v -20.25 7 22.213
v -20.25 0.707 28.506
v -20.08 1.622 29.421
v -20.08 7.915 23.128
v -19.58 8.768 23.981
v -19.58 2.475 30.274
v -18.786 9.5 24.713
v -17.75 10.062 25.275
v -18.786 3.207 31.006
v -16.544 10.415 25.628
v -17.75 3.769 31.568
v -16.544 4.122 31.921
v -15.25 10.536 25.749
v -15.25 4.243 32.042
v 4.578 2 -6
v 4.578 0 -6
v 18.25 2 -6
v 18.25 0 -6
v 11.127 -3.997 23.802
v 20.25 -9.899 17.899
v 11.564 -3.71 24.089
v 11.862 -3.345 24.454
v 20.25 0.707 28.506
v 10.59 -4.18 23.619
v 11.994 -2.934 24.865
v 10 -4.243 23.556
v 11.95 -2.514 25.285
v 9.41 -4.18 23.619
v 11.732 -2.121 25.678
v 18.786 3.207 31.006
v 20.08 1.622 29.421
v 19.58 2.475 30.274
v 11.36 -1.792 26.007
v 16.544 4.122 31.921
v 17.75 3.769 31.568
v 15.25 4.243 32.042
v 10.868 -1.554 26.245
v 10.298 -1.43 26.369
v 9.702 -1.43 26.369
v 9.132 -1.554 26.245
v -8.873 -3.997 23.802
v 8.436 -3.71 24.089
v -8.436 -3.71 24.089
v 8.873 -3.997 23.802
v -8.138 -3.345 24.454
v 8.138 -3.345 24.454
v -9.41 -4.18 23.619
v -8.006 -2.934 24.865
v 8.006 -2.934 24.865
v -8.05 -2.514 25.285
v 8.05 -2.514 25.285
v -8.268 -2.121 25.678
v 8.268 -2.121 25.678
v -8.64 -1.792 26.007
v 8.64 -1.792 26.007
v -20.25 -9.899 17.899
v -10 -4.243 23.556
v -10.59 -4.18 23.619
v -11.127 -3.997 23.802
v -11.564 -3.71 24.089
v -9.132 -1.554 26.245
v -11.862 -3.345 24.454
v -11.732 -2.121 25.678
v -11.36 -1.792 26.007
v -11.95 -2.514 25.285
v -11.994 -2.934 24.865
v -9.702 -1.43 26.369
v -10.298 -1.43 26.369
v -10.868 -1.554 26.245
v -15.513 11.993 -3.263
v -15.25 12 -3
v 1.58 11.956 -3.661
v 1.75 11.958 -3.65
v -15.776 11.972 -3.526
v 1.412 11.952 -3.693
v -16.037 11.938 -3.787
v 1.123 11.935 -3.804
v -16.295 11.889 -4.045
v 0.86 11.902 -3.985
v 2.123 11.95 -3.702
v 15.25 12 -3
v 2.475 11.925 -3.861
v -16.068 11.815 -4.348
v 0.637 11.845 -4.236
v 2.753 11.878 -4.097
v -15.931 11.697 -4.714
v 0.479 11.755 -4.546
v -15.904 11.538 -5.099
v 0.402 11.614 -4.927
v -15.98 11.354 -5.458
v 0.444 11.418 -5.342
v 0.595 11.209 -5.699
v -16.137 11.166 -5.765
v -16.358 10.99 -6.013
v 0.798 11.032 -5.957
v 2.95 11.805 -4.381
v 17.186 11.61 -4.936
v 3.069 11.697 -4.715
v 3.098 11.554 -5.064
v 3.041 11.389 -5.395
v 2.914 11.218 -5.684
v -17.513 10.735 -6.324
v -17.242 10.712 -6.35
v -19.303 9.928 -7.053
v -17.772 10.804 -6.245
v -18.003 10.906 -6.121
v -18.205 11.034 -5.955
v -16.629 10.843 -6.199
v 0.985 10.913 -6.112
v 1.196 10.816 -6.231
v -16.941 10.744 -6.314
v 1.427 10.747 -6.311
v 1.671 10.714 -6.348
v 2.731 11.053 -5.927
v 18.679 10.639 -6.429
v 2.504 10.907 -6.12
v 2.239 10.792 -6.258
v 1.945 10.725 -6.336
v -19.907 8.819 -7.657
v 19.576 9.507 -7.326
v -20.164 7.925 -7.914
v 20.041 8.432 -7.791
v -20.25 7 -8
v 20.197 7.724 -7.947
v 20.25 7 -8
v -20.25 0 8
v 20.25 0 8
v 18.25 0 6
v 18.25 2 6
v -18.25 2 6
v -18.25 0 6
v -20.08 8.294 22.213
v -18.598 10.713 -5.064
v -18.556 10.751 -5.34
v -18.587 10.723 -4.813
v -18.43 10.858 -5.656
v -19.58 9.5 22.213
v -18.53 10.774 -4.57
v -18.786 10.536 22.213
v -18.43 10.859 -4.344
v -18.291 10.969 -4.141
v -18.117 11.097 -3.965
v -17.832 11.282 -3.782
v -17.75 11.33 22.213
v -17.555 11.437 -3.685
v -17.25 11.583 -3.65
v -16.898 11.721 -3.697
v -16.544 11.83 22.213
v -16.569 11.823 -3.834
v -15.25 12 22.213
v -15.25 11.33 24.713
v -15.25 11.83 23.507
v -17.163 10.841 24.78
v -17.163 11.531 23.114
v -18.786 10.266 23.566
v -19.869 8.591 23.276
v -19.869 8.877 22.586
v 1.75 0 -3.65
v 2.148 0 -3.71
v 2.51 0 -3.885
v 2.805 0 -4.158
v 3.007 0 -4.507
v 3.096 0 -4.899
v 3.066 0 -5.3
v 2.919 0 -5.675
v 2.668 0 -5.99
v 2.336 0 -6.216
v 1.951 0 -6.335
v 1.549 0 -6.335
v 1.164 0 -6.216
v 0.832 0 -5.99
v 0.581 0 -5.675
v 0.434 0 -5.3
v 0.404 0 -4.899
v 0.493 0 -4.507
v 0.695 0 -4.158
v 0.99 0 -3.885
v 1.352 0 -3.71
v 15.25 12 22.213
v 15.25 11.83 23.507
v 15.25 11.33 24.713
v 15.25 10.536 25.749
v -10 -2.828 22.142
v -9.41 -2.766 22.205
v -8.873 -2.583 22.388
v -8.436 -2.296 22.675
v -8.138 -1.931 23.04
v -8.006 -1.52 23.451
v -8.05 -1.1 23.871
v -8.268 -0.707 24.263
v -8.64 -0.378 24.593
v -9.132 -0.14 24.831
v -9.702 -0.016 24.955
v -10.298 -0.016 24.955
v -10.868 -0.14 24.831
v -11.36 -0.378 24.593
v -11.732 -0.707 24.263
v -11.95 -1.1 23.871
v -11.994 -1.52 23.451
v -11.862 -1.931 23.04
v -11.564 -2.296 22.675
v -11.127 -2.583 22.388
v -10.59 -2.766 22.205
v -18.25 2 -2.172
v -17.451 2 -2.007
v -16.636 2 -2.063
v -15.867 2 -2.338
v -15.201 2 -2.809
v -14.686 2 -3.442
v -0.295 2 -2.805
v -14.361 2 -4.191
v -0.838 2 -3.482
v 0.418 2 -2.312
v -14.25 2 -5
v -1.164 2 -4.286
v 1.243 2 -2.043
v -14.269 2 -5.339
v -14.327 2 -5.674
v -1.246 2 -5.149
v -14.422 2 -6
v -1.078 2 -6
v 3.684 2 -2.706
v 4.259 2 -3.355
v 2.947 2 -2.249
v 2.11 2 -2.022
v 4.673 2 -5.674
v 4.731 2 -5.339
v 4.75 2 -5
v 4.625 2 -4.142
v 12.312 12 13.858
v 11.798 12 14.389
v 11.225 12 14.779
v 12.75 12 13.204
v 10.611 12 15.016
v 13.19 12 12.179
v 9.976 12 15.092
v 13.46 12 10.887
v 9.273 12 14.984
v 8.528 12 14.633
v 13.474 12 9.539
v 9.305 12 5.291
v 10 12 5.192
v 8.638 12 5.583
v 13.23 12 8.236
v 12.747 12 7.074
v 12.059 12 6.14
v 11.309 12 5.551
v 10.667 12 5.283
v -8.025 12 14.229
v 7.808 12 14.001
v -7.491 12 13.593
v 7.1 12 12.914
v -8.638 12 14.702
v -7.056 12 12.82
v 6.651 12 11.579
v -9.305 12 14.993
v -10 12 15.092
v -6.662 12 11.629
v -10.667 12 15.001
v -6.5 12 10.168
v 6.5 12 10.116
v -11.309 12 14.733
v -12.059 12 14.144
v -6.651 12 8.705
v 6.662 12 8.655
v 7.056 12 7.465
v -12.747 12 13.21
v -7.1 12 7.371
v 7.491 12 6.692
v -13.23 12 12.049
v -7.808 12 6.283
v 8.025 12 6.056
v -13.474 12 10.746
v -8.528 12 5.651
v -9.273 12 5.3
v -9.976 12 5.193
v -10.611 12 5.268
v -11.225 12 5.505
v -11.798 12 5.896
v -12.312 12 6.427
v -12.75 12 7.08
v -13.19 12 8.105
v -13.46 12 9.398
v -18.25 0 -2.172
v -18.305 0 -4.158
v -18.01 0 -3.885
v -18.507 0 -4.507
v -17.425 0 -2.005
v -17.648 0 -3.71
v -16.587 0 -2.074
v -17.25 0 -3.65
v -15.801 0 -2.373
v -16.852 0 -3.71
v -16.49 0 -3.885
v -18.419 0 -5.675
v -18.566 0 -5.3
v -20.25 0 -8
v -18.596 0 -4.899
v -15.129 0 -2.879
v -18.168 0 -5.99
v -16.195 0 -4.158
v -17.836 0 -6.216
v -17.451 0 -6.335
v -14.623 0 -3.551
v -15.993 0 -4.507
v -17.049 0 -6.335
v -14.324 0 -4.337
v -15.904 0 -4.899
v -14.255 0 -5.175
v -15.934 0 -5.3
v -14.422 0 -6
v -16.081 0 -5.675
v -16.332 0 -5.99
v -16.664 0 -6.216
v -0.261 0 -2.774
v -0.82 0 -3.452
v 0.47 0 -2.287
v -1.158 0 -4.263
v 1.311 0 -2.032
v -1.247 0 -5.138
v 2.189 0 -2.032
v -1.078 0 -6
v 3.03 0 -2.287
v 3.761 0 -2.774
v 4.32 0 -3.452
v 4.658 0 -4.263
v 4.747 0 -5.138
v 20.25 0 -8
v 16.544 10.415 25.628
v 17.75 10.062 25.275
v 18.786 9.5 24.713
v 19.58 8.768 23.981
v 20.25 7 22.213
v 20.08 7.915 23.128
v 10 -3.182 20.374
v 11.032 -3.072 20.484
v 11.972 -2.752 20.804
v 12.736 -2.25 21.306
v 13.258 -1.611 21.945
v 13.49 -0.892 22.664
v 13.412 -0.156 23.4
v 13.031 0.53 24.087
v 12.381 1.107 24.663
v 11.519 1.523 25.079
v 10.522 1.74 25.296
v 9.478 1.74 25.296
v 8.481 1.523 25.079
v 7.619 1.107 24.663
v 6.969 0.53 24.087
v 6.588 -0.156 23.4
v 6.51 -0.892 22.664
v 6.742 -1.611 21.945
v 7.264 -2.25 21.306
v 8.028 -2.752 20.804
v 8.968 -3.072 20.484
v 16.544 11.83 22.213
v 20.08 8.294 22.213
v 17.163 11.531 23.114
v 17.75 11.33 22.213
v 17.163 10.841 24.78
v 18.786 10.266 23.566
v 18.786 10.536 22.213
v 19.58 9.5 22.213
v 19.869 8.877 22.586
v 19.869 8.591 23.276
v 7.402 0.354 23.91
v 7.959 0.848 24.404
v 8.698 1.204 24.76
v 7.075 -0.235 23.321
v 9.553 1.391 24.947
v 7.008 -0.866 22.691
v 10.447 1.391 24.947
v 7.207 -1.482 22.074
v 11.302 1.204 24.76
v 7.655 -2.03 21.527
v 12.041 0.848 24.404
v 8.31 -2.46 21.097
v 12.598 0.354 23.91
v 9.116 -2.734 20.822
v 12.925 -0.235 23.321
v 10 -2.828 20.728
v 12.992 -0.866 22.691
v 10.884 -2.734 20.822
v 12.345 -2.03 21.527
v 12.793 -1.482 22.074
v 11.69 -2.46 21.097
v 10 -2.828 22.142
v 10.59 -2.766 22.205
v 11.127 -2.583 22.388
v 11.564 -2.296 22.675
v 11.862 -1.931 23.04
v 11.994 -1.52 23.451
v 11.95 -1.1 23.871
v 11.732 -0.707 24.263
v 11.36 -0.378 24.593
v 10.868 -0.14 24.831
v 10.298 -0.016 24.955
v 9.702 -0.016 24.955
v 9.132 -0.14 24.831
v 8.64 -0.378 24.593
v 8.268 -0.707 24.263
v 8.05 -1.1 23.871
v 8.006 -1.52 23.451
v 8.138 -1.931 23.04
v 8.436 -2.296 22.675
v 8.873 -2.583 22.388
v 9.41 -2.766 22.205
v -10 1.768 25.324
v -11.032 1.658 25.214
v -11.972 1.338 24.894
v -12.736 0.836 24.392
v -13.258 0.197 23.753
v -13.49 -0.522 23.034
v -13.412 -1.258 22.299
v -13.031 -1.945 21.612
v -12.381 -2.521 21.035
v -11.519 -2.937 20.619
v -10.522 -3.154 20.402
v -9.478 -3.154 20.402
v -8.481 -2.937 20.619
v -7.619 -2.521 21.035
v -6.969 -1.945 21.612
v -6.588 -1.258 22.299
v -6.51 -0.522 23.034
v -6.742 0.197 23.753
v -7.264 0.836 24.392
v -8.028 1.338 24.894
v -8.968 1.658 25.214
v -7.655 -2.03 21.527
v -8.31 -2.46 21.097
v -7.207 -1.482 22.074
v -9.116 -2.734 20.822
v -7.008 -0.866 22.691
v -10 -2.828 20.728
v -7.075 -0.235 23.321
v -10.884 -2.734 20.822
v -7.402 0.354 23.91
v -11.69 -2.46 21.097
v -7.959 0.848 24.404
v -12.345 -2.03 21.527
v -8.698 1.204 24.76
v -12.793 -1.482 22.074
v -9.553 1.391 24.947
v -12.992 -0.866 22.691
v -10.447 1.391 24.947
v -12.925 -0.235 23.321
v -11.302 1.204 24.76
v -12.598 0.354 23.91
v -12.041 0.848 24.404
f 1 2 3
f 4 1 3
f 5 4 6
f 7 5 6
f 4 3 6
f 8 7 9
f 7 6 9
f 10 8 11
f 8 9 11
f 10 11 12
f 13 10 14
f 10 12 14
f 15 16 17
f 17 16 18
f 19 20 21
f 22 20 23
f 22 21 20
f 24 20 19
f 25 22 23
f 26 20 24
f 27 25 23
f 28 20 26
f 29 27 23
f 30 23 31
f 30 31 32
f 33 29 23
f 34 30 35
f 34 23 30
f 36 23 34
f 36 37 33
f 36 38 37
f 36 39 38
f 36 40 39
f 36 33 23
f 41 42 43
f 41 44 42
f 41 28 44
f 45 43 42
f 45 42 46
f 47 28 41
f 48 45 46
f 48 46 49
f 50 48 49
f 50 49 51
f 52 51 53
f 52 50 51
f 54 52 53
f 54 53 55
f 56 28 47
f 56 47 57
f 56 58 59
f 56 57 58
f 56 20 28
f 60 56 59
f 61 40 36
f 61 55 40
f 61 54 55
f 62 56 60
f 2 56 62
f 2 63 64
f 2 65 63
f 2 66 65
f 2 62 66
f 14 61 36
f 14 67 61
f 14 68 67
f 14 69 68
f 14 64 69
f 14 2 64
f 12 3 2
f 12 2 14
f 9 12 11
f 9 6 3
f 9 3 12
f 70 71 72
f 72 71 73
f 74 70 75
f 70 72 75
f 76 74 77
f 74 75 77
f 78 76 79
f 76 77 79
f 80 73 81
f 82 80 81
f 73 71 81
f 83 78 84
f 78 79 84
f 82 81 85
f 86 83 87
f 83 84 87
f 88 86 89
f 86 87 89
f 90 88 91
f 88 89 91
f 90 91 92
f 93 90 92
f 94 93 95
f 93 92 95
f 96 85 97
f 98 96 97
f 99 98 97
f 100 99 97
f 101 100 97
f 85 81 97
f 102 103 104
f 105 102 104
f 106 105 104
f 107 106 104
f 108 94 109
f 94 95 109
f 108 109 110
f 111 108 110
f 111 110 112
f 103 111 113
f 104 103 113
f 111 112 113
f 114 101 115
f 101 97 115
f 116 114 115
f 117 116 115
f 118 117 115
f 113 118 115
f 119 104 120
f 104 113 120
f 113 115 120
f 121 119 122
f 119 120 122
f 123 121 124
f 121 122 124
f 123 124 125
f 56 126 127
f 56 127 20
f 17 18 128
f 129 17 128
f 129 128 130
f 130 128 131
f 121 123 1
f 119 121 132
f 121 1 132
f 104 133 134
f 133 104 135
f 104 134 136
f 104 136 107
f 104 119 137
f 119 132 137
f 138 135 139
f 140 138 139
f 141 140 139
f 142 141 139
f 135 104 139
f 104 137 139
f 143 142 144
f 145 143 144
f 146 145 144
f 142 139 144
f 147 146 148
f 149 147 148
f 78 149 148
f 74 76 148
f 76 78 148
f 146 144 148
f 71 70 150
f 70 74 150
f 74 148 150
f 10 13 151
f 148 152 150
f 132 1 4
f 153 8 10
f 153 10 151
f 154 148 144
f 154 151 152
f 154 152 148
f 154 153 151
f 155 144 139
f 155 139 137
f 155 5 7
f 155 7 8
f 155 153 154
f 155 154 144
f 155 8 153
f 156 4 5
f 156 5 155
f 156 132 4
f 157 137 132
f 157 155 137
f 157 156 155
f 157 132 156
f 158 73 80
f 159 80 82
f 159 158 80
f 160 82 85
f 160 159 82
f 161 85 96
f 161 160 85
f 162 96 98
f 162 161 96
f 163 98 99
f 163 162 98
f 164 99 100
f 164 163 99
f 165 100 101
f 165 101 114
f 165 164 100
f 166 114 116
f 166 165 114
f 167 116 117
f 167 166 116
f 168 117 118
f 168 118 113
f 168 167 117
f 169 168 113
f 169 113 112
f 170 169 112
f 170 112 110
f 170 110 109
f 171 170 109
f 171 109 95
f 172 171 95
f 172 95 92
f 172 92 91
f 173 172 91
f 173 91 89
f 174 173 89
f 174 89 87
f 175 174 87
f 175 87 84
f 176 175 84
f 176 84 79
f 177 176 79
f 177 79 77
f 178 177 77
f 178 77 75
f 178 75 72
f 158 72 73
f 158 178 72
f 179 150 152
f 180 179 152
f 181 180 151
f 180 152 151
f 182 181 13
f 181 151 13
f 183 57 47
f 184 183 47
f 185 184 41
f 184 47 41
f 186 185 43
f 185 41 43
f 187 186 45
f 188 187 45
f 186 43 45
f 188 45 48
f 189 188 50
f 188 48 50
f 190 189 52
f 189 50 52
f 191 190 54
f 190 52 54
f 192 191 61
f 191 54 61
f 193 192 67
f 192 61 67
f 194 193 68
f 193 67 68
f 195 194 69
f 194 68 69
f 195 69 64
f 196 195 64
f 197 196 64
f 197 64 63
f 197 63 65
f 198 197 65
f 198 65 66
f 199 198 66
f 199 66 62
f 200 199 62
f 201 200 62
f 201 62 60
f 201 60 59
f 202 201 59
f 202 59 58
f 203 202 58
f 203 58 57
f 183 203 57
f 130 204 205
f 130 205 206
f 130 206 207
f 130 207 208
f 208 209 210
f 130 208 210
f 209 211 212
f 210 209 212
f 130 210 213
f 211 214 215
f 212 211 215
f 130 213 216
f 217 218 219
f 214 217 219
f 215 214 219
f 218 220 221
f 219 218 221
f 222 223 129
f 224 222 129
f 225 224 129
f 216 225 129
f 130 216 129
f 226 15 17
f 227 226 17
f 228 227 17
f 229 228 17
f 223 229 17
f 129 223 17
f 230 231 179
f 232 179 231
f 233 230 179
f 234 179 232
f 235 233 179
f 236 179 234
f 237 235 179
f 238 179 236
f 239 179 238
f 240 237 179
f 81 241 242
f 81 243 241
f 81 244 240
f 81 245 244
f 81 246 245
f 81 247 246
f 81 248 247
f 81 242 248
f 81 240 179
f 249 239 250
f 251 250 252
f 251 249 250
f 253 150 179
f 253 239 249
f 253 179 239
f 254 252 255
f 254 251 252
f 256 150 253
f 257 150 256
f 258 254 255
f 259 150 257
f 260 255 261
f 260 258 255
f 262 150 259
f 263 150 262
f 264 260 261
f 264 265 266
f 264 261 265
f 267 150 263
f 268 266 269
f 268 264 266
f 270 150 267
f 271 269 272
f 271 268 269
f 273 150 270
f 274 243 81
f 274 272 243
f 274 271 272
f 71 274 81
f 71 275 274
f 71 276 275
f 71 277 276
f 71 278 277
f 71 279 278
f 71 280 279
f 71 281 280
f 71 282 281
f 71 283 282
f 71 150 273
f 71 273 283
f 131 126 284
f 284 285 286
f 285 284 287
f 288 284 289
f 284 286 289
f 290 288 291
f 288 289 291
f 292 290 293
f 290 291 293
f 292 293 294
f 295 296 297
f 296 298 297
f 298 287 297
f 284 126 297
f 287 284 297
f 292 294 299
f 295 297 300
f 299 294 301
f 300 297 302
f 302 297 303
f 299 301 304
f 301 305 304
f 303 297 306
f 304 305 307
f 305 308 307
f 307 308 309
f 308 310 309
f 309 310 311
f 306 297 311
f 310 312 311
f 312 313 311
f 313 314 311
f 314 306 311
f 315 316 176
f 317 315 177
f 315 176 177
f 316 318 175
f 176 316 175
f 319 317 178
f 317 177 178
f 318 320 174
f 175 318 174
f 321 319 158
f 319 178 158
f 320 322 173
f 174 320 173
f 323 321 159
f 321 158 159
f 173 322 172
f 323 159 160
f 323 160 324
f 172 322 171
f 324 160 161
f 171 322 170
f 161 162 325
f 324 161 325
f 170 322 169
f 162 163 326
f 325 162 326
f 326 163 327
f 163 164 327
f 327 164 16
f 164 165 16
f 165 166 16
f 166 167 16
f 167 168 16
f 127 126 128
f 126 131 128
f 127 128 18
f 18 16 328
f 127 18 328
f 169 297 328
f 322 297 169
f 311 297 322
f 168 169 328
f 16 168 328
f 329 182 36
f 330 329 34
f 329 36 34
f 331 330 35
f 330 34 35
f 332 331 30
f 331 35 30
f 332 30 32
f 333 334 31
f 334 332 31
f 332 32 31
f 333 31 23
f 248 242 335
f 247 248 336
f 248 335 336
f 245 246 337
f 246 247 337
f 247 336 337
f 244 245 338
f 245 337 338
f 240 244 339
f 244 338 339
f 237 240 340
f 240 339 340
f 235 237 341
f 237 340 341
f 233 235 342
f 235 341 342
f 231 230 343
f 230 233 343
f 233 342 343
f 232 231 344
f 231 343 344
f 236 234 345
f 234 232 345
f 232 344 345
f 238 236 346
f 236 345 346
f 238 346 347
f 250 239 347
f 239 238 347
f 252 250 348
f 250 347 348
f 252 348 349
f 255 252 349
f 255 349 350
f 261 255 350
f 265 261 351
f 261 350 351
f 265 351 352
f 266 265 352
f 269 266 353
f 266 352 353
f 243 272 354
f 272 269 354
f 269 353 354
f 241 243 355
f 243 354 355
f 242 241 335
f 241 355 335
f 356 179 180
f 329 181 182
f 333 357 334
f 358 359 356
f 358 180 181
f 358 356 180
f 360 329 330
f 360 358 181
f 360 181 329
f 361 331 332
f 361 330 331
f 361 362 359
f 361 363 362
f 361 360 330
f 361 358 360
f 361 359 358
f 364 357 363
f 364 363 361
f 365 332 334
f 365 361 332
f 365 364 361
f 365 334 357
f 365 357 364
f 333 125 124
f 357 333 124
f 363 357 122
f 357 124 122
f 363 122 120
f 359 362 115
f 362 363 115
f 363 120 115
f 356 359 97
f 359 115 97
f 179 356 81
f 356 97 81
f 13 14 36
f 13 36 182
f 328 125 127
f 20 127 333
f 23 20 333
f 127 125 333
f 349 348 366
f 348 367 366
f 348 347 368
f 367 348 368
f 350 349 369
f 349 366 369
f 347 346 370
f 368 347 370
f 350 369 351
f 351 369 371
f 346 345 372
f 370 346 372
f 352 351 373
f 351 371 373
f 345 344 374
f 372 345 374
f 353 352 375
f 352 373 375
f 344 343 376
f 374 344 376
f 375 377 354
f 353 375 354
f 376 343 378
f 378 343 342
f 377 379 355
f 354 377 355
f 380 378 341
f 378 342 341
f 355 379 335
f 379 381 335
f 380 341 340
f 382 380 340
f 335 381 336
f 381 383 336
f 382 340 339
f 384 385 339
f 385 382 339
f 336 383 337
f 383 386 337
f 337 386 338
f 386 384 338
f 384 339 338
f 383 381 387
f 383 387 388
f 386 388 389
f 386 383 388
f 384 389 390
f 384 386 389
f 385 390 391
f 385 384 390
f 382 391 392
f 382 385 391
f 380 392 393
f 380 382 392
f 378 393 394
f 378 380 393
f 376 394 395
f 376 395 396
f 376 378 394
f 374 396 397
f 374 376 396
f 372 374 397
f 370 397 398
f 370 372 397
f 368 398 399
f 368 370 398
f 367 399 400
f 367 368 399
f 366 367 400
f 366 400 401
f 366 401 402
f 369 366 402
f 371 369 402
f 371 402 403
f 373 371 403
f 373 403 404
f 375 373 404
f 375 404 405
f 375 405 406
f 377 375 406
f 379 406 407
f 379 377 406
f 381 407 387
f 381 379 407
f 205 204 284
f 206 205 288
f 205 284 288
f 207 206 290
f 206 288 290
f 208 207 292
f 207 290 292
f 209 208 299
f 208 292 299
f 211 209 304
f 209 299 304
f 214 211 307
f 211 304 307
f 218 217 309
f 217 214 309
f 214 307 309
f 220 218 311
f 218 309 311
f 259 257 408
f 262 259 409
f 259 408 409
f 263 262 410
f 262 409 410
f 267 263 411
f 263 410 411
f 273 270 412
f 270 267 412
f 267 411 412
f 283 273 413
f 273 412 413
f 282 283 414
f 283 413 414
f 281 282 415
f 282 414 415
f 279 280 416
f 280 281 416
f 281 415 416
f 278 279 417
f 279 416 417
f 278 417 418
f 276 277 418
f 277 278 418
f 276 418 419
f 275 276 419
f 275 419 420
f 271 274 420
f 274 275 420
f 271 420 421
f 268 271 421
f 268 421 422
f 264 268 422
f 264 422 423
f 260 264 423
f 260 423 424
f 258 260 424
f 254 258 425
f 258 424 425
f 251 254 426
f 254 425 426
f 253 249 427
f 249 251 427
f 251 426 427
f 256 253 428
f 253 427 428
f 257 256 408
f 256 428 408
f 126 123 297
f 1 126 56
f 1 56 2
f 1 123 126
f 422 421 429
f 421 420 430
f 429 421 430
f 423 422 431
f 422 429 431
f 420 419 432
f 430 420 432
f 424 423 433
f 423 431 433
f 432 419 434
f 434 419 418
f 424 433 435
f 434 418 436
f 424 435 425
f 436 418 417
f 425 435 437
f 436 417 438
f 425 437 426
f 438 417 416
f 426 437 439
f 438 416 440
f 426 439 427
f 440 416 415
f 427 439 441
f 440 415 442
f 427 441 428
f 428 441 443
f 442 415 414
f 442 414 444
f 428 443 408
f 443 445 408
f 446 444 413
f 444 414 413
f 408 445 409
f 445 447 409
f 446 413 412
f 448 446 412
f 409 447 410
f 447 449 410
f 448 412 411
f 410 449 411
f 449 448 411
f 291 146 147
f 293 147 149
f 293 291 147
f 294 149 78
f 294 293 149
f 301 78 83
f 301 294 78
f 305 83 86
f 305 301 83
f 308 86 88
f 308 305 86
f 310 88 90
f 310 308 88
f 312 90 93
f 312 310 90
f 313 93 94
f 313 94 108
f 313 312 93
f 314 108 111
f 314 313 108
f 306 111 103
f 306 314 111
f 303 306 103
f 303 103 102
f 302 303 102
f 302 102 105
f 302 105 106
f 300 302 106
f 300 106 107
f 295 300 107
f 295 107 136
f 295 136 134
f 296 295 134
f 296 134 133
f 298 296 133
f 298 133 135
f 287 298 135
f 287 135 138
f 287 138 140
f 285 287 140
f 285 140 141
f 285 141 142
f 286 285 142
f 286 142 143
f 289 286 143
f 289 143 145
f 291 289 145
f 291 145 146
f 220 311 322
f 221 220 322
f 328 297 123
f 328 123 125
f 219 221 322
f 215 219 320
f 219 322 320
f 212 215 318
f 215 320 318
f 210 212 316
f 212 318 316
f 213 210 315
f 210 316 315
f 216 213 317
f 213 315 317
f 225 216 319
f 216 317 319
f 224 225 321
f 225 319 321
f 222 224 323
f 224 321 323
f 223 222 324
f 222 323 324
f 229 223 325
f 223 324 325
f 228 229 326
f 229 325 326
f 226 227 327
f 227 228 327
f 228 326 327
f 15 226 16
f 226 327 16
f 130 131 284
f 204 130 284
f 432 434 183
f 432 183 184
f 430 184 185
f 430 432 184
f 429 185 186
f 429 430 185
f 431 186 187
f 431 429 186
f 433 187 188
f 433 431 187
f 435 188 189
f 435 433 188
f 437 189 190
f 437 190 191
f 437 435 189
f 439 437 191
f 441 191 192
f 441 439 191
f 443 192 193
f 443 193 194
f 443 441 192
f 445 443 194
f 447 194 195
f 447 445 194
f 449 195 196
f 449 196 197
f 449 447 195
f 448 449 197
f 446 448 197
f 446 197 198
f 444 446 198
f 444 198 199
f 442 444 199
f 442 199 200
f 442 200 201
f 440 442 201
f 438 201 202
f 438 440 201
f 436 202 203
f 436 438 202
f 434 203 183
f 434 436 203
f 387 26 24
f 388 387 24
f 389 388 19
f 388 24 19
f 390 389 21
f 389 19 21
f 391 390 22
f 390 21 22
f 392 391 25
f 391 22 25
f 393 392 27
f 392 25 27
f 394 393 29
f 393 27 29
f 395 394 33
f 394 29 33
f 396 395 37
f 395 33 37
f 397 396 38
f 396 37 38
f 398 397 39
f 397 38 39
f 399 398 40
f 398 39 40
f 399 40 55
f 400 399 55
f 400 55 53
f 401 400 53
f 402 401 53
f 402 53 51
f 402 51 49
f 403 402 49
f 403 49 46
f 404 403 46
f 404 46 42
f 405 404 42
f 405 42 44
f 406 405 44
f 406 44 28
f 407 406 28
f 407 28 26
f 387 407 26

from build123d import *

# Parameters (mm, degrees)
SKETCH1_W           = 40.5
SKETCH1_H           = 16
SKETCH1_R           = 1.35
BOSS_EXTRUDE1_DEPTH = 12
BOSS_EXTRUDE2_START = 2
BOSS_EXTRUDE2_DEPTH = 10
BOSS_EXTRUDE3_DEPTH = 40.5
SKETCH4_R           = 2
CUT_EXTRUDE3_DEPTH  = 40.502331785
CUT_EXTRUDE4_START  = -3
SKETCH4_5_R         = 3.5
SKETCH4_5_R_2       = 2
CUT_EXTRUDE4_DEPTH  = 37.502331785
CHAMFER2_SIZE       = 1
FILLET2_R           = 5


with BuildPart() as part:
    # Sketch1 → Boss-Extrude1 (new body)
    with BuildSketch(Plane(origin=(0, 0, 0), x_dir=(1, 0, 0), z_dir=(0, 1, 0))):
        Rectangle(SKETCH1_W, SKETCH1_H)
        with Locations(Location((-17.25, 5, 0), (0, 0, 270))):
            Circle(SKETCH1_R, mode=Mode.SUBTRACT)
        with BuildLine():
            Line((-14.421572875, 6), (-1.078427125, 6))
            ThreePointArc((-1.078427125, 6), (1.75, 2), (4.578427125, 6))
            Line((4.578427125, 6), (18.25, 6))
            Line((18.25, 6), (18.25, -6))
            Line((18.25, -6), (-18.25, -6))
            Line((-18.25, -6), (-18.25, 2.171572875))
            ThreePointArc((-18.25, 2.171572875), (-15.128679656, 2.878679656), (-14.421572875, 6))
        make_face(mode=Mode.SUBTRACT)
        with Locations(Location((1.75, 5, 0), (0, 0, 270))):
            Circle(SKETCH1_R, mode=Mode.SUBTRACT)
    extrude(amount=BOSS_EXTRUDE1_DEPTH)

    # Sketch1<3> → Boss-Extrude2 (add)
    with BuildSketch(Plane(origin=(0, 0, 0), x_dir=(1, 0, 0), z_dir=(0, 1, 0)).offset(BOSS_EXTRUDE2_START)):
        with BuildLine():
            ThreePointArc((-14.25, 5), (-15.517949192, 2.550510257), (-18.25, 2.171572875))
            Line((-18.25, 2.171572875), (-18.25, -6))
            Line((-18.25, -6), (18.25, -6))
            Line((18.25, -6), (18.25, 6))
            Line((18.25, 6), (4.578427125, 6))
            ThreePointArc((4.578427125, 6), (4.706795679, 5.507305936), (4.75, 5))
            ThreePointArc((4.75, 5), (1.242694064, 2.043204321), (-1.078427125, 6))
            Line((-1.078427125, 6), (-14.421572875, 6))
            ThreePointArc((-14.421572875, 6), (-14.293204321, 5.507305936), (-14.25, 5))
        make_face()
    extrude(amount=BOSS_EXTRUDE2_DEPTH)

    # Sketch3 → Boss-Extrude3 (add)
    with BuildSketch(Plane.ZY.offset(20.25)):
        Polygon((8, 0), (17.899494937, -9.899494937), (32.04163056, 4.242640687), (24.284271247, 12), (8, 12), align=None)
    extrude(amount=-BOSS_EXTRUDE3_DEPTH)

    # Sketch4 → Cut-Extrude3 (cut, through all)
    with BuildSketch(Plane(origin=(0, -13.899494937, 13.899494937), x_dir=(1, 0, 0), z_dir=(0, -0.7071067811865437, 0.7071067811865513))):
        with Locations(Location((-10, 15.656854249, 0), (0, 0, 270))):
            Circle(SKETCH4_R)
        with Locations(Location((10, 15.656854249, 0), (0, 0, 270))):
            Circle(SKETCH4_R)
    extrude(amount=-CUT_EXTRUDE3_DEPTH, mode=Mode.SUBTRACT)

    # Sketch4<5> → Cut-Extrude4 (cut, through all)
    # profile 1 of 2: a face of its own
    with BuildSketch(Plane(origin=(0, -13.899494937, 13.899494937), x_dir=(1, 0, 0), z_dir=(0, -0.7071067811865437, 0.7071067811865513)).offset(CUT_EXTRUDE4_START)):
        with Locations(Location((10, 15.656854249, 0), (0, 0, 270))):
            Circle(SKETCH4_5_R)
        with Locations(Location((10, 15.656854249, 0), (0, 0, 270))):
            Circle(SKETCH4_5_R_2, mode=Mode.SUBTRACT)
    # profile 2 of 2: a face of its own
    with BuildSketch(Plane(origin=(0, -13.899494937, 13.899494937), x_dir=(1, 0, 0), z_dir=(0, -0.7071067811865437, 0.7071067811865513)).offset(CUT_EXTRUDE4_START)):
        with Locations(Location((-10, 15.656854249, 0), (0, 0, 90))):
            Circle(SKETCH4_5_R)
        with Locations(Location((-10, 15.656854249, 0), (0, 0, 270))):
            Circle(SKETCH4_5_R_2, mode=Mode.SUBTRACT)
    extrude(amount=-CUT_EXTRUDE4_DEPTH, mode=Mode.SUBTRACT)

    # Chamfer2
    chamfer2_edges = [part.edges().sort_by_distance(p)[0] for p in [
        (-10, 0.707106781, 24.263455967),
        (10, 0.707106781, 24.263455967),
    ]]
    chamfer(chamfer2_edges, length=CHAMFER2_SIZE)

    # Fillet2
    # the kernel refuses this fillet: 5 mm, written as the material it takes off along each edge
    with BuildSketch(Plane(origin=(15.25, 7, 22.213203436), x_dir=(0, 0.7071067811865516, 0.7071067811865435), z_dir=(1, 0, 0))) as fillet2_piece_1_section:
        Polygon((0, 0), (FILLET2_R, 0), (FILLET2_R, -FILLET2_R * 0.414213562373), (FILLET2_R * 0.707106781187, -FILLET2_R * 0.707106781187), align=None)
    fillet2_piece_1 = extrude(amount=FILLET2_R, mode=Mode.PRIVATE)
    fillet2_piece_1 = fillet2_piece_1 - Plane(origin=(15.25, 7, 22.213203436), x_dir=(0, -0.9238795325112877, -0.3826834323650871), z_dir=(1, 0, 0)) * Sphere(FILLET2_R, mode=Mode.PRIVATE)
    add(fillet2_piece_1, mode=Mode.SUBTRACT)
    with BuildSketch(Plane(origin=(-15.25, 7, 22.213203436), x_dir=(0, 0.7071067811865516, 0.7071067811865435), z_dir=(-1, 0, 0))) as fillet2_piece_2_section:
        Polygon((0, 0), (FILLET2_R, 0), (FILLET2_R, FILLET2_R * 0.414213562373), (FILLET2_R * 0.707106781187, FILLET2_R * 0.707106781187), align=None)
    fillet2_piece_2 = extrude(amount=FILLET2_R, mode=Mode.PRIVATE)
    fillet2_piece_2 = fillet2_piece_2 - Plane(origin=(-15.25, 7, 22.213203436), x_dir=(0, -0.9238795325112877, -0.3826834323650871), z_dir=(-1, 0, 0)) * Sphere(FILLET2_R, mode=Mode.PRIVATE)
    add(fillet2_piece_2, mode=Mode.SUBTRACT)
    with BuildSketch(Plane(origin=(20.25, -4.596194078, 40.880465325), x_dir=(0, -0.7071067811865516, -0.7071067811865435), z_dir=(0, 0.7071067811865435, -0.7071067811865516))) as fillet2_piece_3:
        with BuildLine():
            CenterArc((FILLET2_R, FILLET2_R), FILLET2_R, 180, 90)
            Line((0, FILLET2_R), (0, 0))
            Line((0, 0), (FILLET2_R, 0))
        make_face()
    extrude(amount=21.399494937, mode=Mode.SUBTRACT)
    with BuildSketch(Plane(origin=(-20.25, -4.596194078, 40.880465325), x_dir=(0, -0.7071067811865516, -0.7071067811865435), z_dir=(0, 0.7071067811865435, -0.7071067811865516))) as fillet2_piece_4:
        with BuildLine():
            CenterArc((FILLET2_R, -FILLET2_R), FILLET2_R, 90, 90)
            Line((0, -FILLET2_R), (0, 0))
            Line((0, 0), (FILLET2_R, 0))
        make_face()
    extrude(amount=21.399494937, mode=Mode.SUBTRACT)
    with BuildSketch(Plane(origin=(20.25, 12, -20.5), x_dir=(0, -1, 0), z_dir=(0, 0, 1)), Plane(origin=(-20.25, 12, 22.213203436), x_dir=(0, -1, 0), z_dir=(0, 0, -1))) as fillet2_piece_5:
        with BuildLine():
            CenterArc((FILLET2_R, -FILLET2_R), FILLET2_R, 90, 90)
            Line((0, -FILLET2_R), (0, 0))
            Line((0, 0), (FILLET2_R, 0))
        make_face()
    extrude(amount=42.713203436, mode=Mode.SUBTRACT)
    with BuildSketch(Plane(origin=(-15.25, 12, 24.284271247), x_dir=(0, -0.7071067811865432, 0.7071067811865519), z_dir=(1, 0, 0))) as fillet2_piece_6:
        with BuildLine():
            CenterArc((FILLET2_R * 0.414213562373, FILLET2_R), FILLET2_R, 225, 45)
            Line((-FILLET2_R * 0.292893218813, FILLET2_R * 0.292893218813), (0, 0))
            Line((0, 0), (FILLET2_R * 0.414213562373, 0))
        make_face()
    extrude(amount=30.5, mode=Mode.SUBTRACT)
    with BuildSketch(Plane(origin=(32.75, 12, -8), x_dir=(0, -1, 0), z_dir=(-1, 0, 0))) as fillet2_piece_7:
        with BuildLine():
            CenterArc((FILLET2_R, FILLET2_R), FILLET2_R, 180, 90)
            Line((0, FILLET2_R), (0, 0))
            Line((0, 0), (FILLET2_R, 0))
        make_face()
    extrude(amount=65.5, mode=Mode.SUBTRACT)


solid = part.part
